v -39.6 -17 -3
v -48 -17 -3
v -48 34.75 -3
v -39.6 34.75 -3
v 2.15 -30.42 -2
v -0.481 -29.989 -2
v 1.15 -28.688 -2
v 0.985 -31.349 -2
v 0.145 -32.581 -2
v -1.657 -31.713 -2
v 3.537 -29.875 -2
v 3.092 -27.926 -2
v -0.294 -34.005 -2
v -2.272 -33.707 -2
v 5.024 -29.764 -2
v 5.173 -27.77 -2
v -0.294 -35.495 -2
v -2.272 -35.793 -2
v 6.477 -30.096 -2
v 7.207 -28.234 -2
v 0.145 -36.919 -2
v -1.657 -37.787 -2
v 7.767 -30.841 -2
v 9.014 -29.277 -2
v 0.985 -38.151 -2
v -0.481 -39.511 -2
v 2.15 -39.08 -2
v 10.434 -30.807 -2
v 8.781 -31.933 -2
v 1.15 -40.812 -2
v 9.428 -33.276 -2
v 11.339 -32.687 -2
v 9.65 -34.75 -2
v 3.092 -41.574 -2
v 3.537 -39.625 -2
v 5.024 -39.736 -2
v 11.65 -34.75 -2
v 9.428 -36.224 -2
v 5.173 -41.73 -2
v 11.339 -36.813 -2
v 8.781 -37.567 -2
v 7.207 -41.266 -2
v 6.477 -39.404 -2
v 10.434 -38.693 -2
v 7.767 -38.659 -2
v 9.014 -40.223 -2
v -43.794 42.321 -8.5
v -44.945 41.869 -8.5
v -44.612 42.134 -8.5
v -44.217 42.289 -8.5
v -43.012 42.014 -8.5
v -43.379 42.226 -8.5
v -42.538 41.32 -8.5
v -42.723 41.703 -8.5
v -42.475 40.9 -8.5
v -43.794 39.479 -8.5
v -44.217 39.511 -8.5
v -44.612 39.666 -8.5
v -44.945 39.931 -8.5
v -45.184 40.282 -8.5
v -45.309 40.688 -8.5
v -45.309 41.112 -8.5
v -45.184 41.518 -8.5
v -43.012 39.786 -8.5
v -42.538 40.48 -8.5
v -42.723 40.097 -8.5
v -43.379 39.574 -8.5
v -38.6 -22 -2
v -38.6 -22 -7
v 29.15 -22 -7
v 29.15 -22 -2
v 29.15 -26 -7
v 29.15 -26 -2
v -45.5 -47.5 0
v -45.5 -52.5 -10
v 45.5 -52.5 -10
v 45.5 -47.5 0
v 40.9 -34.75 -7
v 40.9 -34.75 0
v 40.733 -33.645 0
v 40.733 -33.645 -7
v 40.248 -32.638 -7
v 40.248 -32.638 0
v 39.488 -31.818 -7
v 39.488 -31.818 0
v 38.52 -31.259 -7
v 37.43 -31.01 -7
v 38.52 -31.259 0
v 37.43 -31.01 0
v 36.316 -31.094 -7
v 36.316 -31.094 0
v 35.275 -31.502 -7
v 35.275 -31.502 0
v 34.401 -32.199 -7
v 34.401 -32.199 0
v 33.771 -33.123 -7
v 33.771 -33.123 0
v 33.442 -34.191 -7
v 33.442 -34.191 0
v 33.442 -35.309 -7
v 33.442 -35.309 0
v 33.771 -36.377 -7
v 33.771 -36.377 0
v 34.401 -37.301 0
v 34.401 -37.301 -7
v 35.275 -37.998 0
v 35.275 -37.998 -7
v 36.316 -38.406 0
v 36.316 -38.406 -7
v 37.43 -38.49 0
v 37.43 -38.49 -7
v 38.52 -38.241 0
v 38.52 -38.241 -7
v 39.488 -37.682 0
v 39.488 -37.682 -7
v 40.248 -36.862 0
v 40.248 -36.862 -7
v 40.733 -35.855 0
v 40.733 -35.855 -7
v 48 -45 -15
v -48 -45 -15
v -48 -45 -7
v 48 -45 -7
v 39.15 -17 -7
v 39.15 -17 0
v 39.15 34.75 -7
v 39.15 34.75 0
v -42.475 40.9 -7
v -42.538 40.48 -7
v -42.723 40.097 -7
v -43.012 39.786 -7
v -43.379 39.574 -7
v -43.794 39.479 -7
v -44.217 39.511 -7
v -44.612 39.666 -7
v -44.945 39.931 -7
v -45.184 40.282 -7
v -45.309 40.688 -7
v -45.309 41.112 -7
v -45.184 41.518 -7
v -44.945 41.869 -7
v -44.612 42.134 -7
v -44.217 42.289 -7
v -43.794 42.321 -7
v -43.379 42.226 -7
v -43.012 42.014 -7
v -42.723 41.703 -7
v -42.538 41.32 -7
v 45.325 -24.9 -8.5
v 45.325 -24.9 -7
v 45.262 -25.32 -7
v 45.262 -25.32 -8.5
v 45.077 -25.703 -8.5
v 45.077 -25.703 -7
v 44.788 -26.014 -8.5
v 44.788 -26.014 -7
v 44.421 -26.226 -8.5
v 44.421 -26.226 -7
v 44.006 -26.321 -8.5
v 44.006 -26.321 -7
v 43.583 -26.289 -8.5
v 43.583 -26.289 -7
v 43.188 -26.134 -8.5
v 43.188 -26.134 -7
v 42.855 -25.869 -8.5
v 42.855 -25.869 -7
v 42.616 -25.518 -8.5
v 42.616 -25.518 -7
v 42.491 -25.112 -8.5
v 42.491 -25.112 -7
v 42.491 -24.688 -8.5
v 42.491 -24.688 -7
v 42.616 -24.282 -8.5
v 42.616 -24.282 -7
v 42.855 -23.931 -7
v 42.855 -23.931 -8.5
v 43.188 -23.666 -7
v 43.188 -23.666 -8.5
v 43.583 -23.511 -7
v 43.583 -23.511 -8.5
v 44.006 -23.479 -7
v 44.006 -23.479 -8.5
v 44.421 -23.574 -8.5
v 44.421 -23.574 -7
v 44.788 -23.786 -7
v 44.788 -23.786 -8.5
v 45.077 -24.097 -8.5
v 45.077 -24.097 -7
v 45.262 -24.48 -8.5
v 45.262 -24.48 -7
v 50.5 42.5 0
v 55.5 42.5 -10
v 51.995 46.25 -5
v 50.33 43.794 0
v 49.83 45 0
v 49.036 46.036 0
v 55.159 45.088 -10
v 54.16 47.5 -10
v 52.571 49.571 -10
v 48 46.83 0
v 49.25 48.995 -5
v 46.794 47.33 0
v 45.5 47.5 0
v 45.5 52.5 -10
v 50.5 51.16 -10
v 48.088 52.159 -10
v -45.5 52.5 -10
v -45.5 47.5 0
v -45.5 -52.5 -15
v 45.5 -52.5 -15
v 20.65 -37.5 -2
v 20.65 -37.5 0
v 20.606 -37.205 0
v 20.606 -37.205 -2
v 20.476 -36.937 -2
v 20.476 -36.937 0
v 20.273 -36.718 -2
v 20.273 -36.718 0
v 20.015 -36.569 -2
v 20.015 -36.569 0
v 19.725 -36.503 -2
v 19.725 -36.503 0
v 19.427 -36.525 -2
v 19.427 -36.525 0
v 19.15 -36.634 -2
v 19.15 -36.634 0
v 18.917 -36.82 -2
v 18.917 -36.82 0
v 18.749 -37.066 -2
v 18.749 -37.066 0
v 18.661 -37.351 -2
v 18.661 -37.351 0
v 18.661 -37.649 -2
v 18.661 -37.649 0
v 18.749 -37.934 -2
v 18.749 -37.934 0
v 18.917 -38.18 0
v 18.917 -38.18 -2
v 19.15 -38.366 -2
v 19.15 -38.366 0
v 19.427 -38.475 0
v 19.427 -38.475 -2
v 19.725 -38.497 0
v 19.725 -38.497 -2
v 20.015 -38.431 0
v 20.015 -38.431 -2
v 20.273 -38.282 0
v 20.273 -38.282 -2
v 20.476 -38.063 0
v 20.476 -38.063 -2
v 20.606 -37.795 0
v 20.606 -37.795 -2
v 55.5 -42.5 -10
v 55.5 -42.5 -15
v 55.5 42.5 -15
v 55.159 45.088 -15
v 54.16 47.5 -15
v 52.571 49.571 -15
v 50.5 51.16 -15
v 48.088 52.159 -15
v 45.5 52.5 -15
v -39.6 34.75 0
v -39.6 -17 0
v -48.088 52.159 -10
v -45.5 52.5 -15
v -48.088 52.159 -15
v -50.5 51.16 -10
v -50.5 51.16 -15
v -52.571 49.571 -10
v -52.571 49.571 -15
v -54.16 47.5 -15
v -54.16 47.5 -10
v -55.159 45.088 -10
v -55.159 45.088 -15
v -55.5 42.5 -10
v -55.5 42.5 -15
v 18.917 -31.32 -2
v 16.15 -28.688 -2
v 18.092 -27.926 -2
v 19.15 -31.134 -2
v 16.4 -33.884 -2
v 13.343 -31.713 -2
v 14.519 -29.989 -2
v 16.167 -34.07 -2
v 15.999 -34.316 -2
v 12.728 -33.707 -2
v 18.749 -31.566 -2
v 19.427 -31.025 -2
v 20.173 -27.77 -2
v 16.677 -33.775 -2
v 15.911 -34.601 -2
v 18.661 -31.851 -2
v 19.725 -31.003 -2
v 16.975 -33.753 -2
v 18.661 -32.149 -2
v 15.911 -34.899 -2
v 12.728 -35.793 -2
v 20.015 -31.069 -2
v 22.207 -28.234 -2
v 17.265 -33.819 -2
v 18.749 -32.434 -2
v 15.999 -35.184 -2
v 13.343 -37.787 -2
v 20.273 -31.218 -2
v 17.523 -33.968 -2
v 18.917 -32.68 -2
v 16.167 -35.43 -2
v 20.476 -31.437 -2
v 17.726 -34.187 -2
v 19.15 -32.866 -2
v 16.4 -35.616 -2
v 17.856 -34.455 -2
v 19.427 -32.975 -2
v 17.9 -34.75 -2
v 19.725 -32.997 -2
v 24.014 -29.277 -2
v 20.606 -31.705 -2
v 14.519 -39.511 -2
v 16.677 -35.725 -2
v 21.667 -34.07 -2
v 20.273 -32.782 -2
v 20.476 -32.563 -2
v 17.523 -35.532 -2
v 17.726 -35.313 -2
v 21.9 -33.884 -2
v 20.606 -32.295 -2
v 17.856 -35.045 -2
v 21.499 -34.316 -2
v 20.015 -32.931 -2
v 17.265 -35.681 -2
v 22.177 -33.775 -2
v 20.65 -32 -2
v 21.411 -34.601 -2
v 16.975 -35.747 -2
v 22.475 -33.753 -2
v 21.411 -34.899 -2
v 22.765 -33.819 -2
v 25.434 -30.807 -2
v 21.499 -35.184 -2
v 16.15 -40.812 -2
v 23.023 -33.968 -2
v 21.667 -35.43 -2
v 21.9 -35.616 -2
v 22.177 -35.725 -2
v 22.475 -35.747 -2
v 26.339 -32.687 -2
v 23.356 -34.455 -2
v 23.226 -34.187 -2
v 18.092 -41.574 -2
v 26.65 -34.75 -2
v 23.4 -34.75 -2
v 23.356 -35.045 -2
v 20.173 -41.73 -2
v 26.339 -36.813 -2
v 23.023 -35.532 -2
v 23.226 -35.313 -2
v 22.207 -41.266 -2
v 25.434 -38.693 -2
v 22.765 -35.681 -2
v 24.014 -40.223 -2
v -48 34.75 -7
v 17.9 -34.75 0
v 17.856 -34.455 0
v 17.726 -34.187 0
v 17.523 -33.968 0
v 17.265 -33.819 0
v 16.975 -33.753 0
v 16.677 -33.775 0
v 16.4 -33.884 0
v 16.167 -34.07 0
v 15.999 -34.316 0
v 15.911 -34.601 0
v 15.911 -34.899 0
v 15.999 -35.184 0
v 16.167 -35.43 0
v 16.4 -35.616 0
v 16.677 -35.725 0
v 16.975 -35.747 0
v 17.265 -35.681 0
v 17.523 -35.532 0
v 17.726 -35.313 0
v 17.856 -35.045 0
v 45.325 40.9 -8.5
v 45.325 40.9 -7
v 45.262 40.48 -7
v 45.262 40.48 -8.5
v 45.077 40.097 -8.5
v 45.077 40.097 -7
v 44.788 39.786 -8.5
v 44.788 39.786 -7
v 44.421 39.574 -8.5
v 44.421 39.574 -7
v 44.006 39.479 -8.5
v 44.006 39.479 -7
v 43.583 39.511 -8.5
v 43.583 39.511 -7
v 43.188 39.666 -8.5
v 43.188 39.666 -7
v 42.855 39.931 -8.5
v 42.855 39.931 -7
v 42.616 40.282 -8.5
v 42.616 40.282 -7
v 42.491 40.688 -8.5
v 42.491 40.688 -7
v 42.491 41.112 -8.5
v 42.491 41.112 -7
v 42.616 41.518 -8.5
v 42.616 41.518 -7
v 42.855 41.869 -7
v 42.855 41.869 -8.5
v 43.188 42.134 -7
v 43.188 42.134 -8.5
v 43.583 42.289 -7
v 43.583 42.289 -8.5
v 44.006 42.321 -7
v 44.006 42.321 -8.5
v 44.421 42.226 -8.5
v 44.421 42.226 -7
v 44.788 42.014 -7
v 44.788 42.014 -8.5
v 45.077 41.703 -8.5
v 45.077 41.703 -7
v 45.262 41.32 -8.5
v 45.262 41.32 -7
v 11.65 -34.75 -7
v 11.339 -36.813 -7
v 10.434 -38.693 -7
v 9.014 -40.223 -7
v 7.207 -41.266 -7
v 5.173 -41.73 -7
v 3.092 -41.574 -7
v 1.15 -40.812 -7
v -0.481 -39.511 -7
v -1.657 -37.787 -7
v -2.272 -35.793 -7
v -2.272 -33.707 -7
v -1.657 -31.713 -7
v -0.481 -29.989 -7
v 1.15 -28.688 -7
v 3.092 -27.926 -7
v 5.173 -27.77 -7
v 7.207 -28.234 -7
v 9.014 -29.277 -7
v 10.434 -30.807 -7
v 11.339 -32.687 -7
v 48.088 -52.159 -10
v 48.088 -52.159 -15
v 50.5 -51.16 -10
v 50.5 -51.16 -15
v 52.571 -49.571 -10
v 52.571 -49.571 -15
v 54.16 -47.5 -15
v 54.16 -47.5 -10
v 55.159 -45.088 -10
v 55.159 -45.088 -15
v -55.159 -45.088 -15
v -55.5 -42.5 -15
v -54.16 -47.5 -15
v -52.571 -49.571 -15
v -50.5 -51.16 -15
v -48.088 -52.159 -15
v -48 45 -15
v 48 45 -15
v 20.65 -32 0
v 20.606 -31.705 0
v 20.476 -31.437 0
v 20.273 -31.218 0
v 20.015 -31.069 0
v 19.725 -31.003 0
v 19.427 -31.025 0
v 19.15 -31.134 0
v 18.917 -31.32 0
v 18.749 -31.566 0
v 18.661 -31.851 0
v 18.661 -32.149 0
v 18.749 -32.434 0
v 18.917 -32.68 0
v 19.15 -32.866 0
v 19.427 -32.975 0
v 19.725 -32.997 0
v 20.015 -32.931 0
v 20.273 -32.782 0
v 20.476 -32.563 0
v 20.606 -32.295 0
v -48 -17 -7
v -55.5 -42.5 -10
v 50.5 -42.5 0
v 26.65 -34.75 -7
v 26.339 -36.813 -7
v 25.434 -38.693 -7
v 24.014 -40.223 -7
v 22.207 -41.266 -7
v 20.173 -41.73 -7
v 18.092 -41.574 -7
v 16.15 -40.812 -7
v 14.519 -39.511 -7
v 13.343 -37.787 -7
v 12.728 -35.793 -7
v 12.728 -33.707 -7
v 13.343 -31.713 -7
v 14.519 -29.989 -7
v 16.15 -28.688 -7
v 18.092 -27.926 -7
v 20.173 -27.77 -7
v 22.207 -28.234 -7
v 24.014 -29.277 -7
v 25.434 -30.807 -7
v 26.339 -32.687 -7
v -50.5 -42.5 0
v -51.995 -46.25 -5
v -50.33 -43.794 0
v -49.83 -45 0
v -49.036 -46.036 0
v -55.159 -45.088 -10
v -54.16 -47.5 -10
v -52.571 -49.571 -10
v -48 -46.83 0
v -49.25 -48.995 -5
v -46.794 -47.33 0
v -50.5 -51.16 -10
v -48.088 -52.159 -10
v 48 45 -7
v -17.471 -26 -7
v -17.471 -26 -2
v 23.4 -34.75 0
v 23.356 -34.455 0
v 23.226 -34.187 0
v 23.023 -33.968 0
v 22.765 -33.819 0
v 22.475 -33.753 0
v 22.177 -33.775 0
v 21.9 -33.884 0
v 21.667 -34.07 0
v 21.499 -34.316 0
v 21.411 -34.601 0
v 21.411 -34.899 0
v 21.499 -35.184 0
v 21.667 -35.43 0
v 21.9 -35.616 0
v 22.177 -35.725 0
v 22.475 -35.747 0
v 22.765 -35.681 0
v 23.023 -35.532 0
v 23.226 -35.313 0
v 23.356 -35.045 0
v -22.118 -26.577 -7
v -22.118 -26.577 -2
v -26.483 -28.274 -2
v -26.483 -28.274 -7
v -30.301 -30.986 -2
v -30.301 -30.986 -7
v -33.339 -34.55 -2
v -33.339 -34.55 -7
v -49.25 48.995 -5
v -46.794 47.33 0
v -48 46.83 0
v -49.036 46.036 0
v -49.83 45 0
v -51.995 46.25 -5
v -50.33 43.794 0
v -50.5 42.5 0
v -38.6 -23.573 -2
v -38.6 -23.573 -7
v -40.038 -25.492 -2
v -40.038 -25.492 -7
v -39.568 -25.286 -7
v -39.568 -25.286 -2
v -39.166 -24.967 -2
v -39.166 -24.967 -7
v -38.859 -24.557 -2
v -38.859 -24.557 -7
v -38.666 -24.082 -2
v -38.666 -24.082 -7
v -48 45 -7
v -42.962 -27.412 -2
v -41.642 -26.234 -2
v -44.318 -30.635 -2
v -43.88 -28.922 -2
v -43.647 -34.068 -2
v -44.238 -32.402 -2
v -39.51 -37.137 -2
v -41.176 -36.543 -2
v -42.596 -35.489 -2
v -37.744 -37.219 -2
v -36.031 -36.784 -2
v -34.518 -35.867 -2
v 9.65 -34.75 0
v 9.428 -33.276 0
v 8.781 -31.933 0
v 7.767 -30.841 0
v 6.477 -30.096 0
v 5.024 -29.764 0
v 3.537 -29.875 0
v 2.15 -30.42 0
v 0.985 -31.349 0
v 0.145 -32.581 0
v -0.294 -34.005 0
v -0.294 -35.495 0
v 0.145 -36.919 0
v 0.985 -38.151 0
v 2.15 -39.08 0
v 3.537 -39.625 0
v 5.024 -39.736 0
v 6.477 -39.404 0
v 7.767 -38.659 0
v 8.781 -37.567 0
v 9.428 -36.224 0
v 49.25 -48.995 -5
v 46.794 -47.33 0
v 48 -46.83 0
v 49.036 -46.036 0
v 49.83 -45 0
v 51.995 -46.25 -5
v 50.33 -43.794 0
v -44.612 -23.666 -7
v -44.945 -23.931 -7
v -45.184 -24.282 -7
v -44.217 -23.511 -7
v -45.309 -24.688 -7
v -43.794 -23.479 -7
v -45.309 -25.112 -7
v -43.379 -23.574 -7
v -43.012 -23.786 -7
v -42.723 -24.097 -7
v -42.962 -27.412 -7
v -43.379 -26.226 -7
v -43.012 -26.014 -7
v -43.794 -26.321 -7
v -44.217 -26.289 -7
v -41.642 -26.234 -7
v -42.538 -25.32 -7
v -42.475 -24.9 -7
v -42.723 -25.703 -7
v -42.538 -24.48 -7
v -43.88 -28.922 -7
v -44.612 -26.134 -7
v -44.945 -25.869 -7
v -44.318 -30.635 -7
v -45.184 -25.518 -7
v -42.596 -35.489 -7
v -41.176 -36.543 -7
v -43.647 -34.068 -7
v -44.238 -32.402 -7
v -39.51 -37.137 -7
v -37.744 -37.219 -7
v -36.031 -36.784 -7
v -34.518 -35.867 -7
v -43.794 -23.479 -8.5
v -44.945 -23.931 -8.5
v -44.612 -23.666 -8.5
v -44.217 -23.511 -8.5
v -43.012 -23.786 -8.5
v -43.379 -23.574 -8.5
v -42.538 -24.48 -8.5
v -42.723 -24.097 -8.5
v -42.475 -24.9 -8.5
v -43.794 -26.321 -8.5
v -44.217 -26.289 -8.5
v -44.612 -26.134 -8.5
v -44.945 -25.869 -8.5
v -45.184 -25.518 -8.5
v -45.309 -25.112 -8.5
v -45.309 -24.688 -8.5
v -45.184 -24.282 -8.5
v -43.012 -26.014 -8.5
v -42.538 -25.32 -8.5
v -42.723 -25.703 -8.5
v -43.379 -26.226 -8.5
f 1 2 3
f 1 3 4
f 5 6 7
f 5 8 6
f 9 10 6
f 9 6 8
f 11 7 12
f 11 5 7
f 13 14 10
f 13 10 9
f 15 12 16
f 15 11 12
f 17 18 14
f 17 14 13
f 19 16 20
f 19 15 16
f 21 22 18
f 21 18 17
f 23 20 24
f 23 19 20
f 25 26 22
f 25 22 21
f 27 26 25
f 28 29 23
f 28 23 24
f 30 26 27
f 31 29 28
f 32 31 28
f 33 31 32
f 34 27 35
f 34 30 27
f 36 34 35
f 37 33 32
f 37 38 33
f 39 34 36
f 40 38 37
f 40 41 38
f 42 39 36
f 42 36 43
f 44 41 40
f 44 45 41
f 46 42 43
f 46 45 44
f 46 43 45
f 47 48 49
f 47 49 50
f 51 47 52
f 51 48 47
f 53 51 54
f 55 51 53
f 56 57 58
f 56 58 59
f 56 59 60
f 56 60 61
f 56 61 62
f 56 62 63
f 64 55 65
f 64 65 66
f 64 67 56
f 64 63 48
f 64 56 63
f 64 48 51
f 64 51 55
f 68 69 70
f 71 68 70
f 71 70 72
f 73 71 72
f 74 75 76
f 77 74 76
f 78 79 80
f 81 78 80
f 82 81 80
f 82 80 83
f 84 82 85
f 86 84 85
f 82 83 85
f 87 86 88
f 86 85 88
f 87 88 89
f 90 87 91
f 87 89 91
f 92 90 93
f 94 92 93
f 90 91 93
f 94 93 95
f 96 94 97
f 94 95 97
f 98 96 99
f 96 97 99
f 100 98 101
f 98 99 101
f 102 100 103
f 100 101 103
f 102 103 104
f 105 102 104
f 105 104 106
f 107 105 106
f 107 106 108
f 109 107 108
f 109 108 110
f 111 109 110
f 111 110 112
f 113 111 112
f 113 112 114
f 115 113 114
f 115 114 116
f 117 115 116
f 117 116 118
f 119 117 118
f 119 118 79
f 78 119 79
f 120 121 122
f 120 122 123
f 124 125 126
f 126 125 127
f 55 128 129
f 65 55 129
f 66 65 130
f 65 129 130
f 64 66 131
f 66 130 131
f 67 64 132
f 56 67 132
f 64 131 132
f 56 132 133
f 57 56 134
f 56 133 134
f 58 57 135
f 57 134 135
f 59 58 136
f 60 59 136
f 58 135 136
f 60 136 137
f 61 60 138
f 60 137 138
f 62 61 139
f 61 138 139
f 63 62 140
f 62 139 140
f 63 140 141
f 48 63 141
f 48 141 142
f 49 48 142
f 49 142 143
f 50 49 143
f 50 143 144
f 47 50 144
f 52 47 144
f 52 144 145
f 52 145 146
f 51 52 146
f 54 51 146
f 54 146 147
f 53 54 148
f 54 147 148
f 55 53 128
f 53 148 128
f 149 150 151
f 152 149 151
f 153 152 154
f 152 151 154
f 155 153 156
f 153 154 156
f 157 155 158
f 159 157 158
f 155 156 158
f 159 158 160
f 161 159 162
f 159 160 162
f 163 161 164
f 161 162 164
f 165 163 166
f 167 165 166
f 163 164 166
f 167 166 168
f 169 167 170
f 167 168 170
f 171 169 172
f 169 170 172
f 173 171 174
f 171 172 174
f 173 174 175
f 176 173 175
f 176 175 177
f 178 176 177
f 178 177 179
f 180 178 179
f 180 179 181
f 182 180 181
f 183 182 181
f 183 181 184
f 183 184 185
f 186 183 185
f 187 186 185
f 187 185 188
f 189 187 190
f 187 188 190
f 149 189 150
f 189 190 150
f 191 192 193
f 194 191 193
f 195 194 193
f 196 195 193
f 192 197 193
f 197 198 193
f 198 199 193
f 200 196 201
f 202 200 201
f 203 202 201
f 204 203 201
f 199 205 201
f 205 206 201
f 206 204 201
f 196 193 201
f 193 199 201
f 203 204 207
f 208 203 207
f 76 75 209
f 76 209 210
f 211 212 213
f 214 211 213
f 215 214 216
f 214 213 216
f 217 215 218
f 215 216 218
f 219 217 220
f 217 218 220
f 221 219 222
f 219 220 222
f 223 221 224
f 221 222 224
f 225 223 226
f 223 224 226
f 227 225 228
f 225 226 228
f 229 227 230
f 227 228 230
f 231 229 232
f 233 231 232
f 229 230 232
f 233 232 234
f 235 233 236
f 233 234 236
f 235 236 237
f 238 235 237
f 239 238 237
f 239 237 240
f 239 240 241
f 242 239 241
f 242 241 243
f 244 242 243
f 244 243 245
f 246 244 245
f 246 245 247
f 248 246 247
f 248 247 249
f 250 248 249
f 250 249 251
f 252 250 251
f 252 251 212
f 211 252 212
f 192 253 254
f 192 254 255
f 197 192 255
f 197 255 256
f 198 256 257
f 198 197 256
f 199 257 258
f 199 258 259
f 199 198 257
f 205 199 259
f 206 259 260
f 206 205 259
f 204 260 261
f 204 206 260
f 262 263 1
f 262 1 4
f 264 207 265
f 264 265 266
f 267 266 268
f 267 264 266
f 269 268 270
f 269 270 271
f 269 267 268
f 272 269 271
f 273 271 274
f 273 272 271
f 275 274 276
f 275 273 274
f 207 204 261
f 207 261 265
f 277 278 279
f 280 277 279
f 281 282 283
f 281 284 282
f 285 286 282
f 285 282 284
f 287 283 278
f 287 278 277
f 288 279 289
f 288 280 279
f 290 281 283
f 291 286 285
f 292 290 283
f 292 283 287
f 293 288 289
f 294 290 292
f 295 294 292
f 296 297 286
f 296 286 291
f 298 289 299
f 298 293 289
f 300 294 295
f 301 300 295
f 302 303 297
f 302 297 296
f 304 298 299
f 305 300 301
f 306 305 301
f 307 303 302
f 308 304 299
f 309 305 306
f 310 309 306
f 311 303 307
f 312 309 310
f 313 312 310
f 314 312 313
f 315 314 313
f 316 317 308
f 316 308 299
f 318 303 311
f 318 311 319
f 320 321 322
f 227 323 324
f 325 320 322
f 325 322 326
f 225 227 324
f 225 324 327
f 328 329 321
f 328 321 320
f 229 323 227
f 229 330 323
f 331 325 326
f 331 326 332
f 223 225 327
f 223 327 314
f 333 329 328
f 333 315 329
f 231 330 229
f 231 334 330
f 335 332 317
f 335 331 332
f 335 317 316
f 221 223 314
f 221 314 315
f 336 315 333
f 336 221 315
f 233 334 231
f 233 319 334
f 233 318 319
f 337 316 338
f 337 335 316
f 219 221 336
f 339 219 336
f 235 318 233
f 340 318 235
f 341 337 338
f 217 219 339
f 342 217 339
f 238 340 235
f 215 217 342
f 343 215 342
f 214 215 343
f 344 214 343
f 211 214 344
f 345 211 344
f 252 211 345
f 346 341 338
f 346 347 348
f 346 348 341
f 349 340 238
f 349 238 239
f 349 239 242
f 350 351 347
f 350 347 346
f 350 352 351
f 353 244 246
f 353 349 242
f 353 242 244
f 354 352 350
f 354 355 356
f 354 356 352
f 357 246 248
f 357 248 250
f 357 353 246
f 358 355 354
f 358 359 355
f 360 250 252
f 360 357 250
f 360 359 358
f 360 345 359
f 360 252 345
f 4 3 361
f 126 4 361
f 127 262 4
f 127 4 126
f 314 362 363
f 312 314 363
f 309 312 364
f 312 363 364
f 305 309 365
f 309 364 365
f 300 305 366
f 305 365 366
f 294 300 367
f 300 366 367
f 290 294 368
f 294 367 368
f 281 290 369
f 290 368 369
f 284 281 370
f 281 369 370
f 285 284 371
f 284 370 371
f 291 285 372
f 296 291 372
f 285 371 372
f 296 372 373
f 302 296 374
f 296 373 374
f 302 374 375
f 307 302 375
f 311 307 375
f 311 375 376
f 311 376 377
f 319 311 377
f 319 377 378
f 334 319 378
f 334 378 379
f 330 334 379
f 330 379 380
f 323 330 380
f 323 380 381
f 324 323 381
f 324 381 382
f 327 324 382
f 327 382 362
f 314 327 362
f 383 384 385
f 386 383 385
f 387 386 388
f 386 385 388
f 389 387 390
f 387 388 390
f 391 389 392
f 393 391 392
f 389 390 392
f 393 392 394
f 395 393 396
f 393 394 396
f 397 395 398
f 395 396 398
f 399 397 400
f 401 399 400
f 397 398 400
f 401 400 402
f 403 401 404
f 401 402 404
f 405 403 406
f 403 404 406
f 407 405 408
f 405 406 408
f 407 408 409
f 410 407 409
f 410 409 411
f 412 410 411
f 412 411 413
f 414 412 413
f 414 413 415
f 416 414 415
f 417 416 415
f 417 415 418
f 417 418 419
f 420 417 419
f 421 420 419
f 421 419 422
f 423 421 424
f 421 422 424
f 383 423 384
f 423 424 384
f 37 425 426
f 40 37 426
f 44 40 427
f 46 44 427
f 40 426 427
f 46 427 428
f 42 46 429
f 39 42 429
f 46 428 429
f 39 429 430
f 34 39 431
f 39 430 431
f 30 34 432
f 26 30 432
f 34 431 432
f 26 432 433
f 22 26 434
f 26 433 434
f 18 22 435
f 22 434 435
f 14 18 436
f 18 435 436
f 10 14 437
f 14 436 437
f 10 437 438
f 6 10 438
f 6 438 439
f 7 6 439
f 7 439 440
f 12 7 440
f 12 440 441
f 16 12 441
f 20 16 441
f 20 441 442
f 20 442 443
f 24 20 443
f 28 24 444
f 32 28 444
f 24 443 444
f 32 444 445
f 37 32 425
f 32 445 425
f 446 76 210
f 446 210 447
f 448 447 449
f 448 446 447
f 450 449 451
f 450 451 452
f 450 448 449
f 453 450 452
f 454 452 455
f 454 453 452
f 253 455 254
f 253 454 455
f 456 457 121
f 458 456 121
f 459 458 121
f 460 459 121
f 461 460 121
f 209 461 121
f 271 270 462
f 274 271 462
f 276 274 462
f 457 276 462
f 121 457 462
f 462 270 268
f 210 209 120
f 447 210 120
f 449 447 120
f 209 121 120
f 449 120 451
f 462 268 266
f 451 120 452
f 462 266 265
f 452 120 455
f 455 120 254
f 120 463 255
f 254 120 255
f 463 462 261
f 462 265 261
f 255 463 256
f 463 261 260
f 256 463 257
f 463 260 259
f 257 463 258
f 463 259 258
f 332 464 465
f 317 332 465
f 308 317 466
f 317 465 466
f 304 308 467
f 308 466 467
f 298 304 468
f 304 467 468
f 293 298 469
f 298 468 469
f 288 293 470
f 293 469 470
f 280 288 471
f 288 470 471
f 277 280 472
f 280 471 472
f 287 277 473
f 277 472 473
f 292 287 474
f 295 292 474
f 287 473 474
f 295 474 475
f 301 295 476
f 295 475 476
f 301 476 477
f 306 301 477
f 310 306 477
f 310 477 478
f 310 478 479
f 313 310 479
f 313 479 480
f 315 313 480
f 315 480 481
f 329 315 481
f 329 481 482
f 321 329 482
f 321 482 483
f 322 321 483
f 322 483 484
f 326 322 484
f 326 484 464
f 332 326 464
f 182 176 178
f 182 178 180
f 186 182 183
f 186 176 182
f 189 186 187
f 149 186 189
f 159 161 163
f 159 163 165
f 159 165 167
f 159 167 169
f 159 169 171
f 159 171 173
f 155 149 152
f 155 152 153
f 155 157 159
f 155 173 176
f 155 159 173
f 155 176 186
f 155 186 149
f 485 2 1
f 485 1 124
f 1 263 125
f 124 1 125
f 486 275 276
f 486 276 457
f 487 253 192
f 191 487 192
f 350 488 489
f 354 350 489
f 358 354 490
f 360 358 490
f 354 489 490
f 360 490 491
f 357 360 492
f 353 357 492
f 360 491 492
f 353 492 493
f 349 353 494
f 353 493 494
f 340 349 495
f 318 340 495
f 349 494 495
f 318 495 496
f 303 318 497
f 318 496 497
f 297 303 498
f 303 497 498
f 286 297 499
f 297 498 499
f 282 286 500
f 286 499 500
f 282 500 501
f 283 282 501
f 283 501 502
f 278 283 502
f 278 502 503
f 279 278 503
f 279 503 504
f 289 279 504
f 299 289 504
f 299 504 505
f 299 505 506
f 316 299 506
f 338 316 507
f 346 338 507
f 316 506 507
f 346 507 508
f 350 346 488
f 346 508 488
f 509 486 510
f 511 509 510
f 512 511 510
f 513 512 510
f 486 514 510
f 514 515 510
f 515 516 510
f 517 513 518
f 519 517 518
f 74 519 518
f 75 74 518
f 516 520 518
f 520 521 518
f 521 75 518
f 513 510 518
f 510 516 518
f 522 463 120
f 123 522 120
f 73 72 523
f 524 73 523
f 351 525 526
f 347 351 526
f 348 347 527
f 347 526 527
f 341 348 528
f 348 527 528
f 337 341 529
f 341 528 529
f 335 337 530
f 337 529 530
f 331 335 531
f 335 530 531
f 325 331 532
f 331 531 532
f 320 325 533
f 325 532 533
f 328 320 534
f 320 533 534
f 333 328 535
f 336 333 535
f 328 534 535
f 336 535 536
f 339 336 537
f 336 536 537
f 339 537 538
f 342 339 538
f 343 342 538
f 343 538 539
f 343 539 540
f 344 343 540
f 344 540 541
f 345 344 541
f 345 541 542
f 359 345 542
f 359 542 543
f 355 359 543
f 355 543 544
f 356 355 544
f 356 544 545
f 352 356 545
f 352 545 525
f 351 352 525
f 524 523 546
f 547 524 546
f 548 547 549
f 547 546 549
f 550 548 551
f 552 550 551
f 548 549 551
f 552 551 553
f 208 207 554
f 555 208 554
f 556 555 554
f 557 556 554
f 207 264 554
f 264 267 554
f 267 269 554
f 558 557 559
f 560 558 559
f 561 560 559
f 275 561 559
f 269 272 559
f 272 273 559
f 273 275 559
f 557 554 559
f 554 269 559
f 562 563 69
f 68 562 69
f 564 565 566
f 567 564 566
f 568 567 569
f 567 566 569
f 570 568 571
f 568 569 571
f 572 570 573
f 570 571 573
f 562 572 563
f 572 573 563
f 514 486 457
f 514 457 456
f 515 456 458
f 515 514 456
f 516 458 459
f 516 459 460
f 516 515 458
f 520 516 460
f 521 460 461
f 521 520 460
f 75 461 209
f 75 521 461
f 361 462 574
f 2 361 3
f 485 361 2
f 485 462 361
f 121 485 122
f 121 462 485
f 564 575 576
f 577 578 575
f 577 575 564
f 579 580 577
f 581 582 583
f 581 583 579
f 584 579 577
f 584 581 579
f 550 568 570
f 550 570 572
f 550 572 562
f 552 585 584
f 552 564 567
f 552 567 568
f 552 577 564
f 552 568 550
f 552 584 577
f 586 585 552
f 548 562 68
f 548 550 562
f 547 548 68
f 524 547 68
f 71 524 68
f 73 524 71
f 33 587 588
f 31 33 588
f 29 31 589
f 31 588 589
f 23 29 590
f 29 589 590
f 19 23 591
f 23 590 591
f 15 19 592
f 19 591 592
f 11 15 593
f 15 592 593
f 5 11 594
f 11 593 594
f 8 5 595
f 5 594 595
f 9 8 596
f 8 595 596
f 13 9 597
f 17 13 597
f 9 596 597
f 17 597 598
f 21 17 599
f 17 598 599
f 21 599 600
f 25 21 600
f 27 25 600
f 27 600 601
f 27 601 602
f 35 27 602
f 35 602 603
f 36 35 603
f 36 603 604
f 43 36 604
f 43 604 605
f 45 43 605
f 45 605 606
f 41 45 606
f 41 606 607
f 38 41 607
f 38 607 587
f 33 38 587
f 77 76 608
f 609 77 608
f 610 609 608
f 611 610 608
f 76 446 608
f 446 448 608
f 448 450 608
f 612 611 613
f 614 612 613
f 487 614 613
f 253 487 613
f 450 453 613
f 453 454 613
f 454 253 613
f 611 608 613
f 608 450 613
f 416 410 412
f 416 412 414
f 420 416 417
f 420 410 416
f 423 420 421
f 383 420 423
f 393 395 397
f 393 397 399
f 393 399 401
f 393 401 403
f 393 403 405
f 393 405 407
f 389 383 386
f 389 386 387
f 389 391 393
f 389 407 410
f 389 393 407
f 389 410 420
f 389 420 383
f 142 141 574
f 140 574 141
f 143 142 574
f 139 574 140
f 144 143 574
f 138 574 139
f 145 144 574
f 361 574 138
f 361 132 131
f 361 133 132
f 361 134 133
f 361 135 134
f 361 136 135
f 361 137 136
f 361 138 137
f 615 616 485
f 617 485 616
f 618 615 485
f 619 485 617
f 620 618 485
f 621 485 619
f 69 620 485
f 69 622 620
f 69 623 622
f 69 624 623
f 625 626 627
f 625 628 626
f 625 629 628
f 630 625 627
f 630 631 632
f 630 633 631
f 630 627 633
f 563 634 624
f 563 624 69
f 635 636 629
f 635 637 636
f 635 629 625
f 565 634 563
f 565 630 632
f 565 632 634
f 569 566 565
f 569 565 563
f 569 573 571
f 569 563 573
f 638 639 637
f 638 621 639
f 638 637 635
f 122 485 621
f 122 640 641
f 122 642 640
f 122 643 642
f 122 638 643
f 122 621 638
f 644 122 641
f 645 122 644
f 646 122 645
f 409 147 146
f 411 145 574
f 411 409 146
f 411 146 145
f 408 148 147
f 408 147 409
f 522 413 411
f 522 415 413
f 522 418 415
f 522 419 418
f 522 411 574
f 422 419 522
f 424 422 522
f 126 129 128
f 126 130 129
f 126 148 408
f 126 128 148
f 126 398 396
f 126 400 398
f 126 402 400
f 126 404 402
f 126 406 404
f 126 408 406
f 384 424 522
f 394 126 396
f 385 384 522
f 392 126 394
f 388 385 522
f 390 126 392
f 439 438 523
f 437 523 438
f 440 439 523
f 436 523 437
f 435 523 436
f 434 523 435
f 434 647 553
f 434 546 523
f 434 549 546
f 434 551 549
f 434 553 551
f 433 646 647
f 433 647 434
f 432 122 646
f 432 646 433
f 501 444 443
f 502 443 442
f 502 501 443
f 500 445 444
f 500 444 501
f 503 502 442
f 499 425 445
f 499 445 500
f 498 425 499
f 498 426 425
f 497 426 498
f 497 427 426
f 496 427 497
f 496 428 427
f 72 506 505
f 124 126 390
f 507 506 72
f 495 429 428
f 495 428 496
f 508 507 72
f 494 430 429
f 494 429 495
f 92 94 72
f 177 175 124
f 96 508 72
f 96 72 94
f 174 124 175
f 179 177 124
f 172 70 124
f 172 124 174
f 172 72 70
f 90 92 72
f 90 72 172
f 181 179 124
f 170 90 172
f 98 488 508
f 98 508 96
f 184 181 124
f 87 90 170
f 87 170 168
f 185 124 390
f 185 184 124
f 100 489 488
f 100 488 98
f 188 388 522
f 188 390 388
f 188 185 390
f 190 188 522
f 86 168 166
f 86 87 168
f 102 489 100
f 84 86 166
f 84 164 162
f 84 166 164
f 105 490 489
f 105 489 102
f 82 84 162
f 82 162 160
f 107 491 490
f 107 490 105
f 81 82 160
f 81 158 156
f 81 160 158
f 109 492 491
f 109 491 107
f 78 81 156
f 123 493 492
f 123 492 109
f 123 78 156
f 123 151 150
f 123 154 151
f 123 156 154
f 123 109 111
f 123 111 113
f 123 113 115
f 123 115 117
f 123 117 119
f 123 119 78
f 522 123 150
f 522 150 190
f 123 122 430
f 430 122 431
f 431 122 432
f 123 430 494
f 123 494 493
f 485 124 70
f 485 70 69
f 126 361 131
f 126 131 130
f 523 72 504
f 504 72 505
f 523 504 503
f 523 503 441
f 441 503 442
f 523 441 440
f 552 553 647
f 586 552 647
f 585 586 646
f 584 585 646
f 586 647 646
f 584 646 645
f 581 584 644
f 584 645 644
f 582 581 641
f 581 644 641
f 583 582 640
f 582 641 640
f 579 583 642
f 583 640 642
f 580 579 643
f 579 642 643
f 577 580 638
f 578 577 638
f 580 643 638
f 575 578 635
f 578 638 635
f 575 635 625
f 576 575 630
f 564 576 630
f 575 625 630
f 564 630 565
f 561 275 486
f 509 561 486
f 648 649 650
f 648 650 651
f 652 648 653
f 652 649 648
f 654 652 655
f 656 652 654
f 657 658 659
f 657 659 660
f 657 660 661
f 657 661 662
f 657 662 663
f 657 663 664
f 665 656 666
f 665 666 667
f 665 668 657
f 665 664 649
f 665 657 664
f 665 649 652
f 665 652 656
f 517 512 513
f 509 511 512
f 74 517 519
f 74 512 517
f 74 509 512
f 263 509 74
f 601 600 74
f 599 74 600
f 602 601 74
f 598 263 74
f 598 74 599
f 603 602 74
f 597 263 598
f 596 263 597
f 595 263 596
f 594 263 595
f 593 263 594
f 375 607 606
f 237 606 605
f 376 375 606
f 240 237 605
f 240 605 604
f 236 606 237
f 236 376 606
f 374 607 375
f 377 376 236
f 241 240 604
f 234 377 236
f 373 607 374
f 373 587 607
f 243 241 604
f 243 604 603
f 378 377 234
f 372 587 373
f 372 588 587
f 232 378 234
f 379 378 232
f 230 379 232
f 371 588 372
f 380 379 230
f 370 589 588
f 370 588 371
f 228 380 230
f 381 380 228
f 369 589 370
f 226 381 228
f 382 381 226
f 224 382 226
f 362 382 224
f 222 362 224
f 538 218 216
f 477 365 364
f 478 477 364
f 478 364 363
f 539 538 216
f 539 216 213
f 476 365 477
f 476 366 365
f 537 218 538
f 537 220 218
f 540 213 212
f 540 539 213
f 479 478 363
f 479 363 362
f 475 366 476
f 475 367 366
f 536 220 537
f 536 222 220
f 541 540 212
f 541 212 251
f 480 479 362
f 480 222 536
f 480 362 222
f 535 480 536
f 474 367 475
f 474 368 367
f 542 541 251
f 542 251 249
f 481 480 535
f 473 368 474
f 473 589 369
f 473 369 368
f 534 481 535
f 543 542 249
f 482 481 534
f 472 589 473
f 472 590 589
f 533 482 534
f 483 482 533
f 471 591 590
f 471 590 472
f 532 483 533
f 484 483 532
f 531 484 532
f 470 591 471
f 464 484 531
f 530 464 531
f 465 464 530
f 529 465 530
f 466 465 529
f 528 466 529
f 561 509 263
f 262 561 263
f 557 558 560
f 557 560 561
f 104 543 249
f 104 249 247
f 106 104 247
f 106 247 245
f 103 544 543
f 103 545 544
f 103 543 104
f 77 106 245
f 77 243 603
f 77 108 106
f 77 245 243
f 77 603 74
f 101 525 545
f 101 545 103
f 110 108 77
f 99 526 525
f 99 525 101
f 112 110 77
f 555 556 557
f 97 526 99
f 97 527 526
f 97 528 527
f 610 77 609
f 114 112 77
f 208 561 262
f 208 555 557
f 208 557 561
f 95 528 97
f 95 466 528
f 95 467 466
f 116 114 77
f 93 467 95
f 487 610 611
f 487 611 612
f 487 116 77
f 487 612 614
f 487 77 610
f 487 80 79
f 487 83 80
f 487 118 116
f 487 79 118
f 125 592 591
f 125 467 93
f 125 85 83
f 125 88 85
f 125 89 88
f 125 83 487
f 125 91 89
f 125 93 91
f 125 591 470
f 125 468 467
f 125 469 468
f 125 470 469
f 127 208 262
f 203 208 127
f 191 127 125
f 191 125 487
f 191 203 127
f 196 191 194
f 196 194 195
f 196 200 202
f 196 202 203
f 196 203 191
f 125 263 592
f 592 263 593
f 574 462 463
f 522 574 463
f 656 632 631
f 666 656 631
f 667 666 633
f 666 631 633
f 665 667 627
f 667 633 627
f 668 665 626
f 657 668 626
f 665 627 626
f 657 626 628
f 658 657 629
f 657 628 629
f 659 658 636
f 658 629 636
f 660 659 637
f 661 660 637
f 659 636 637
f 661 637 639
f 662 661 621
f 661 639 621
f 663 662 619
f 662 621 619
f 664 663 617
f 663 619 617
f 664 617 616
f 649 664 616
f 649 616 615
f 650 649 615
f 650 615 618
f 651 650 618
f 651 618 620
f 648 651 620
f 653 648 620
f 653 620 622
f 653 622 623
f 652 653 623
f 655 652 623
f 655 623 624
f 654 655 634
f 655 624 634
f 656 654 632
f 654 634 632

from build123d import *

# Parameters (mm, degrees)
F2_DEPTH  = 15
F3_SIZE2  = 10
F3_SIZE   = 5
F4_W      = 78.75
F4_H      = 51.75
F4_R      = 5
F4_R_2    = 3.75
F4_R_3    = 1
F5_DEPTH  = 15.001
F6_W      = 96
F6_H      = 90
F7_DEPTH  = 8
F8_R      = 1.425
F9_DEPTH  = 1.5
F10_W     = 8.4
F10_H     = 51.75
F11_DEPTH = 4
F12_R     = 7
F13_DEPTH = 5
F15_DEPTH = 5


with BuildPart() as f2:
    # F1 (on Top) → F2 (new body)
    with BuildSketch(Plane.XY):
        with BuildLine():
            Line((45.5, 52.5), (-45.5, 52.5))
            ThreePointArc((-45.5, 52.5), (-52.5710678119, 49.5710678119), (-55.5, 42.5))
            Line((-55.5, 42.5), (-55.5, -42.5))
            ThreePointArc((-55.5, -42.5), (-52.5710678119, -49.5710678119), (-45.5, -52.5))
            Line((-45.5, -52.5), (45.5, -52.5))
            ThreePointArc((45.5, -52.5), (52.5710678119, -49.5710678119), (55.5, -42.5))
            Line((55.5, -42.5), (55.5, 42.5))
            ThreePointArc((55.5, 42.5), (52.5710678119, 49.5710678119), (45.5, 52.5))
        make_face()
    extrude(amount=-F2_DEPTH)

    # F3
    f3_edges = [f2.edges().sort_by_distance(p)[0] for p in [
        (-55.5, 0, 0),
    ]]
    f3_side = f2.faces().sort_by_distance((0, 0, 0))[0]
    chamfer(f3_edges, length=F3_SIZE, length2=F3_SIZE2, reference=f3_side)

    # F4 (on Top) → F5 (cut, through all)
    with BuildSketch(Plane.XY):
        with Locations((-0.225, 8.875)):
            Rectangle(F4_W, F4_H)
        with Locations((4.65, -34.75)):
            Circle(F4_R)
        with Locations((37.15, -34.75)):
            Circle(F4_R_2)
        with Locations((16.9, -34.75)):
            Circle(F4_R_3)
        with Locations((19.65, -32)):
            Circle(F4_R_3)
        with Locations((22.4, -34.75)):
            Circle(F4_R_3)
        with Locations((19.65, -37.5)):
            Circle(F4_R_3)
    extrude(amount=-F5_DEPTH, mode=Mode.SUBTRACT)

    # F6 (on face) → F7 (cut)
    with BuildSketch(Plane(origin=(0, 0, -15), x_dir=(1, 0, 0), z_dir=(0, 0, -1))):
        Rectangle(F6_W, F6_H)
    extrude(amount=-F7_DEPTH, mode=Mode.SUBTRACT)

    # F8 (on face) → F9 (join)
    with BuildSketch(Plane(origin=(0, 0, -7), x_dir=(1, 0, 0), z_dir=(0, 0, -1))):
        with Locations((43.9, -40.9)):
            Circle(F8_R)
        with Locations((-43.9, -40.9)):
            Circle(F8_R)
        with Locations((-43.9, 24.9)):
            Circle(F8_R)
        with Locations((43.9, 24.9)):
            Circle(F8_R)
    extrude(amount=F9_DEPTH)

    # F10 (on face) → F11 (cut)
    with BuildSketch(Plane(origin=(0, 0, -7), x_dir=(1, 0, 0), z_dir=(0, 0, -1))):
        with Locations((-43.8, -8.875)):
            Rectangle(F10_W, F10_H)
    extrude(amount=-F11_DEPTH, mode=Mode.SUBTRACT)

    # F12 (on face) → F13 (cut)
    with BuildSketch(Plane(origin=(0, 0, -7), x_dir=(1, 0, 0), z_dir=(0, 0, -1))):
        with Locations((4.65, 34.75)):
            Circle(F12_R)
        with Locations((19.65, 34.75)):
            Circle(F12_R)
    extrude(amount=-F13_DEPTH, mode=Mode.SUBTRACT)

    # F14 (on face) → F15 (cut)
    with BuildSketch(Plane(origin=(0, 0, -7), x_dir=(1, 0, 0), z_dir=(0, 0, -1))):
        with BuildLine():
            Line((-38.6, 22), (29.15, 22))
            Line((29.15, 22), (29.15, 26))
            Line((29.15, 26), (-17.4708836394, 26))
            ThreePointArc((-17.4708836394, 26), (-26.4833749709, 28.2735239814), (-33.3390120735, 34.55))
            ThreePointArc((-33.3390120735, 34.55), (-43.1741435319, 34.8175816996), (-40.0375, 25.4921928002))
            ThreePointArc((-40.0375, 25.4921928002), (-38.9992189406, 24.7718816144), (-38.6, 23.5729237336))
            Line((-38.6, 23.5729237336), (-38.6, 22))
        make_face()
    extrude(amount=-F15_DEPTH, mode=Mode.SUBTRACT)


solid = f2.part
